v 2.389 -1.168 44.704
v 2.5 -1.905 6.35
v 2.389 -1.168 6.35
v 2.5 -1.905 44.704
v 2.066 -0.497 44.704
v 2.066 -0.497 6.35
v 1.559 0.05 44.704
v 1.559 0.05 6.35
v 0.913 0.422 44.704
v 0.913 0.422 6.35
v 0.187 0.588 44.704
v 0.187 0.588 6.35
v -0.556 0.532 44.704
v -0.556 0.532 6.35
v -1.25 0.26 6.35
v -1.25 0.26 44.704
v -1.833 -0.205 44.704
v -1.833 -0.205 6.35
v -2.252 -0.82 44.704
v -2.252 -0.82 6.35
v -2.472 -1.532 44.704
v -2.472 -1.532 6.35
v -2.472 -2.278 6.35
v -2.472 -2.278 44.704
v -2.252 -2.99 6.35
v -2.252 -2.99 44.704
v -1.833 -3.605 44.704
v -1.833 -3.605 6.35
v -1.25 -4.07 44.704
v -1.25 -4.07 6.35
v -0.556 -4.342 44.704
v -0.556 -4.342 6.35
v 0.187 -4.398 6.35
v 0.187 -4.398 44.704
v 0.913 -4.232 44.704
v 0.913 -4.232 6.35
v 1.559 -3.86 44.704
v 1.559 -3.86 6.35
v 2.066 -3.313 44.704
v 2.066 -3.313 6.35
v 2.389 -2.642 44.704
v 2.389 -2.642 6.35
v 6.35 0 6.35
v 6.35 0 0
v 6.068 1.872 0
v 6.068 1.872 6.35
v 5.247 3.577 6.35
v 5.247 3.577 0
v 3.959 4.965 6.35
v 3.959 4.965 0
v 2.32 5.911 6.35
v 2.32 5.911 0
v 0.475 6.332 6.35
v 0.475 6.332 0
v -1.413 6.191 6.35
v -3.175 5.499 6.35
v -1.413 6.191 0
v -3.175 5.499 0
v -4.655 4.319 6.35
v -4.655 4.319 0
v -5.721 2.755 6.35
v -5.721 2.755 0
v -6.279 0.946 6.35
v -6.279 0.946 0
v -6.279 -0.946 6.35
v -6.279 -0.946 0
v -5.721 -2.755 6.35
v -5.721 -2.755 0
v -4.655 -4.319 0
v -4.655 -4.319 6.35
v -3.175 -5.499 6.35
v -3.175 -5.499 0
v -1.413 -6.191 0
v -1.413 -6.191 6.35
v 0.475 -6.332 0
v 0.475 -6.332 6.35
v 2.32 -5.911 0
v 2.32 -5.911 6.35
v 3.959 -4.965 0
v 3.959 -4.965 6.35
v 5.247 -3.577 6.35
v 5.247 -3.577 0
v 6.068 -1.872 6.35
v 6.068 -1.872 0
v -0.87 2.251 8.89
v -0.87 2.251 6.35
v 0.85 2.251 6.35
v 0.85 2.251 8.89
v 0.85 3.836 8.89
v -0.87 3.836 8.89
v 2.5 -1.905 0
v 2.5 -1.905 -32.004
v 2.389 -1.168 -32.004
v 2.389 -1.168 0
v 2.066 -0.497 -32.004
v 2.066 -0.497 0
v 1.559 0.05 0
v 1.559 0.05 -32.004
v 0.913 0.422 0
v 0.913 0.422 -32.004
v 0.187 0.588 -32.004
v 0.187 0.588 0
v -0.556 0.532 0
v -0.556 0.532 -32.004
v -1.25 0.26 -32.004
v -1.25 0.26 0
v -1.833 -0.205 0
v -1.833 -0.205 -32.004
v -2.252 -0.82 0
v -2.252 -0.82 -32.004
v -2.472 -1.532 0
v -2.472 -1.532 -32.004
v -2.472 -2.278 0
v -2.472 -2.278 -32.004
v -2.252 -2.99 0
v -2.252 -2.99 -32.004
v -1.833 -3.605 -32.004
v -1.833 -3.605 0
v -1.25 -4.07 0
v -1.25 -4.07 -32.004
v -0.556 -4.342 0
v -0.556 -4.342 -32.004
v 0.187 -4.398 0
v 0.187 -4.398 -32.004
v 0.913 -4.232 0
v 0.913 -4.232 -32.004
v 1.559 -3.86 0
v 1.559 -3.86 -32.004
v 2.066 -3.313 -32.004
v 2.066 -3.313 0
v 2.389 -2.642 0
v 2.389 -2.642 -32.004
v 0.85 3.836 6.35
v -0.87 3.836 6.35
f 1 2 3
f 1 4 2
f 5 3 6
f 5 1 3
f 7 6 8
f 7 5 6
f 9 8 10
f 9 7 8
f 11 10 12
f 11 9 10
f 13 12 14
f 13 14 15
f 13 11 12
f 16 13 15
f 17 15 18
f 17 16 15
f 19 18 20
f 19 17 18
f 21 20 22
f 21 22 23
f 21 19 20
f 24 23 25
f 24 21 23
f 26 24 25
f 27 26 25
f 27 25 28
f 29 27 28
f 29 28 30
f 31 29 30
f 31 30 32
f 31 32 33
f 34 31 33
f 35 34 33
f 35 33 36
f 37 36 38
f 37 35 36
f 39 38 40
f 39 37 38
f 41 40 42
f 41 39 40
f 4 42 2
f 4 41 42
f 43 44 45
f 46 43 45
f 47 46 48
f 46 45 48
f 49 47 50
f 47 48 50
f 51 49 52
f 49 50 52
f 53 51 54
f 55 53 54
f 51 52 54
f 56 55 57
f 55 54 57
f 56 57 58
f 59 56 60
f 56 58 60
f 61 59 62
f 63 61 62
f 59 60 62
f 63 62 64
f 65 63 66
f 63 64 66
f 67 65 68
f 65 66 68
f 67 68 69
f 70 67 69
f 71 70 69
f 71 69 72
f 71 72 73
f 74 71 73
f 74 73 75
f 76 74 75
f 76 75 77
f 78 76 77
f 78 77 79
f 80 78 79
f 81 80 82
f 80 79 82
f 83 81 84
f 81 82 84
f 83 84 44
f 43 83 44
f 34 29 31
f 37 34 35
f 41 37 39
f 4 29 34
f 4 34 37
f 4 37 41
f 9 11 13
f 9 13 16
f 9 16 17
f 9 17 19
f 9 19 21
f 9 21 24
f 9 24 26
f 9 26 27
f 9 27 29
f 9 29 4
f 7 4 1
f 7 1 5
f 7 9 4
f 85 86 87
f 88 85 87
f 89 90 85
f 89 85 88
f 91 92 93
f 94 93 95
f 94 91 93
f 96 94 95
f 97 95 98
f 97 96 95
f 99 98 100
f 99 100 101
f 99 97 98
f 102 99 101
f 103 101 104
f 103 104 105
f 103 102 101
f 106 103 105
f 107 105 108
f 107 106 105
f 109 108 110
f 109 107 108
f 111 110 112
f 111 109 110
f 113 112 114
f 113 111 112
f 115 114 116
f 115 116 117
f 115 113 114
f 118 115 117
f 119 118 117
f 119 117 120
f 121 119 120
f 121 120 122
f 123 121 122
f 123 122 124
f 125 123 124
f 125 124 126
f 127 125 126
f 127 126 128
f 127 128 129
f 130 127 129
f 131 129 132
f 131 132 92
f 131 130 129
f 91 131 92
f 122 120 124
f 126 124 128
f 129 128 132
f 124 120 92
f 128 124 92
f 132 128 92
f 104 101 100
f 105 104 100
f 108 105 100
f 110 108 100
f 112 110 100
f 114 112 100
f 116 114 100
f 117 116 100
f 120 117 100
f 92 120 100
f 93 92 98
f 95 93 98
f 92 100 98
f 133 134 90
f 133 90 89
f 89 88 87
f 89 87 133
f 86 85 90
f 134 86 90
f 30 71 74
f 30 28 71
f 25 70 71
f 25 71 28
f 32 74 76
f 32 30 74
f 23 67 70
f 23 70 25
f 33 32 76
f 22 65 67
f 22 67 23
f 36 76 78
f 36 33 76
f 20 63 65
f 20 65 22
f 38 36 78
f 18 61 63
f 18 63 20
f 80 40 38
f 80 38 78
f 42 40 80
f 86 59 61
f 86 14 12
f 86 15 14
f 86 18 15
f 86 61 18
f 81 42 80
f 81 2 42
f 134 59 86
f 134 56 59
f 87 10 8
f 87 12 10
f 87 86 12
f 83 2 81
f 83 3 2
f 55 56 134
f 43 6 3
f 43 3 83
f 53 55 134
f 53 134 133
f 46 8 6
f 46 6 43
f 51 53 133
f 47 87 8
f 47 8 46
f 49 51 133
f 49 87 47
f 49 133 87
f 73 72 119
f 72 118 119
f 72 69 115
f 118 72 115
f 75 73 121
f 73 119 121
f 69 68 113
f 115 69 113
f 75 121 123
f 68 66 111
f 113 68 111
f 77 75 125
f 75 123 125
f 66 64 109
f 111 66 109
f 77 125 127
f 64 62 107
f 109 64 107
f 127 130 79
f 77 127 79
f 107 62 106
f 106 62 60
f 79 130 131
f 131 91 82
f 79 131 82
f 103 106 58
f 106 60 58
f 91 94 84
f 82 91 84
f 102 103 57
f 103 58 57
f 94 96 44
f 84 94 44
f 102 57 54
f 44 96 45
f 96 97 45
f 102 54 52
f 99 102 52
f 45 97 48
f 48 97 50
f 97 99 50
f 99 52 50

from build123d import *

# Parameters (mm, degrees)
SKETCH1_R           = 6.35
BOSS_EXTRUDE1_DEPTH = 6.35
SKETCH2_W           = 1.71989263
SKETCH2_H           = 1.584620177
BOSS_EXTRUDE2_DEPTH = 2.54
SKETCH3_R           = 2.499995
BOSS_EXTRUDE3_DEPTH = 38.354


with BuildPart() as part:
    # Sketch1 → Boss-Extrude1 (new body)
    with BuildSketch(Plane.XY):
        Circle(SKETCH1_R)
    extrude(amount=BOSS_EXTRUDE1_DEPTH)

    # Sketch2 → Boss-Extrude2 (add)
    with BuildSketch(Plane.XY.offset(6.35)):
        with Locations((-0.009662318, 3.043630217)):
            Rectangle(SKETCH2_W, SKETCH2_H)
    extrude(amount=BOSS_EXTRUDE2_DEPTH)

    # Sketch3 → Boss-Extrude3 (add, symmetric)
    with BuildSketch(Plane.XY.offset(6.35)):
        with Locations((0, -1.905)):
            Circle(SKETCH3_R)
    extrude(amount=BOSS_EXTRUDE3_DEPTH, both=True)


solid = part.part
